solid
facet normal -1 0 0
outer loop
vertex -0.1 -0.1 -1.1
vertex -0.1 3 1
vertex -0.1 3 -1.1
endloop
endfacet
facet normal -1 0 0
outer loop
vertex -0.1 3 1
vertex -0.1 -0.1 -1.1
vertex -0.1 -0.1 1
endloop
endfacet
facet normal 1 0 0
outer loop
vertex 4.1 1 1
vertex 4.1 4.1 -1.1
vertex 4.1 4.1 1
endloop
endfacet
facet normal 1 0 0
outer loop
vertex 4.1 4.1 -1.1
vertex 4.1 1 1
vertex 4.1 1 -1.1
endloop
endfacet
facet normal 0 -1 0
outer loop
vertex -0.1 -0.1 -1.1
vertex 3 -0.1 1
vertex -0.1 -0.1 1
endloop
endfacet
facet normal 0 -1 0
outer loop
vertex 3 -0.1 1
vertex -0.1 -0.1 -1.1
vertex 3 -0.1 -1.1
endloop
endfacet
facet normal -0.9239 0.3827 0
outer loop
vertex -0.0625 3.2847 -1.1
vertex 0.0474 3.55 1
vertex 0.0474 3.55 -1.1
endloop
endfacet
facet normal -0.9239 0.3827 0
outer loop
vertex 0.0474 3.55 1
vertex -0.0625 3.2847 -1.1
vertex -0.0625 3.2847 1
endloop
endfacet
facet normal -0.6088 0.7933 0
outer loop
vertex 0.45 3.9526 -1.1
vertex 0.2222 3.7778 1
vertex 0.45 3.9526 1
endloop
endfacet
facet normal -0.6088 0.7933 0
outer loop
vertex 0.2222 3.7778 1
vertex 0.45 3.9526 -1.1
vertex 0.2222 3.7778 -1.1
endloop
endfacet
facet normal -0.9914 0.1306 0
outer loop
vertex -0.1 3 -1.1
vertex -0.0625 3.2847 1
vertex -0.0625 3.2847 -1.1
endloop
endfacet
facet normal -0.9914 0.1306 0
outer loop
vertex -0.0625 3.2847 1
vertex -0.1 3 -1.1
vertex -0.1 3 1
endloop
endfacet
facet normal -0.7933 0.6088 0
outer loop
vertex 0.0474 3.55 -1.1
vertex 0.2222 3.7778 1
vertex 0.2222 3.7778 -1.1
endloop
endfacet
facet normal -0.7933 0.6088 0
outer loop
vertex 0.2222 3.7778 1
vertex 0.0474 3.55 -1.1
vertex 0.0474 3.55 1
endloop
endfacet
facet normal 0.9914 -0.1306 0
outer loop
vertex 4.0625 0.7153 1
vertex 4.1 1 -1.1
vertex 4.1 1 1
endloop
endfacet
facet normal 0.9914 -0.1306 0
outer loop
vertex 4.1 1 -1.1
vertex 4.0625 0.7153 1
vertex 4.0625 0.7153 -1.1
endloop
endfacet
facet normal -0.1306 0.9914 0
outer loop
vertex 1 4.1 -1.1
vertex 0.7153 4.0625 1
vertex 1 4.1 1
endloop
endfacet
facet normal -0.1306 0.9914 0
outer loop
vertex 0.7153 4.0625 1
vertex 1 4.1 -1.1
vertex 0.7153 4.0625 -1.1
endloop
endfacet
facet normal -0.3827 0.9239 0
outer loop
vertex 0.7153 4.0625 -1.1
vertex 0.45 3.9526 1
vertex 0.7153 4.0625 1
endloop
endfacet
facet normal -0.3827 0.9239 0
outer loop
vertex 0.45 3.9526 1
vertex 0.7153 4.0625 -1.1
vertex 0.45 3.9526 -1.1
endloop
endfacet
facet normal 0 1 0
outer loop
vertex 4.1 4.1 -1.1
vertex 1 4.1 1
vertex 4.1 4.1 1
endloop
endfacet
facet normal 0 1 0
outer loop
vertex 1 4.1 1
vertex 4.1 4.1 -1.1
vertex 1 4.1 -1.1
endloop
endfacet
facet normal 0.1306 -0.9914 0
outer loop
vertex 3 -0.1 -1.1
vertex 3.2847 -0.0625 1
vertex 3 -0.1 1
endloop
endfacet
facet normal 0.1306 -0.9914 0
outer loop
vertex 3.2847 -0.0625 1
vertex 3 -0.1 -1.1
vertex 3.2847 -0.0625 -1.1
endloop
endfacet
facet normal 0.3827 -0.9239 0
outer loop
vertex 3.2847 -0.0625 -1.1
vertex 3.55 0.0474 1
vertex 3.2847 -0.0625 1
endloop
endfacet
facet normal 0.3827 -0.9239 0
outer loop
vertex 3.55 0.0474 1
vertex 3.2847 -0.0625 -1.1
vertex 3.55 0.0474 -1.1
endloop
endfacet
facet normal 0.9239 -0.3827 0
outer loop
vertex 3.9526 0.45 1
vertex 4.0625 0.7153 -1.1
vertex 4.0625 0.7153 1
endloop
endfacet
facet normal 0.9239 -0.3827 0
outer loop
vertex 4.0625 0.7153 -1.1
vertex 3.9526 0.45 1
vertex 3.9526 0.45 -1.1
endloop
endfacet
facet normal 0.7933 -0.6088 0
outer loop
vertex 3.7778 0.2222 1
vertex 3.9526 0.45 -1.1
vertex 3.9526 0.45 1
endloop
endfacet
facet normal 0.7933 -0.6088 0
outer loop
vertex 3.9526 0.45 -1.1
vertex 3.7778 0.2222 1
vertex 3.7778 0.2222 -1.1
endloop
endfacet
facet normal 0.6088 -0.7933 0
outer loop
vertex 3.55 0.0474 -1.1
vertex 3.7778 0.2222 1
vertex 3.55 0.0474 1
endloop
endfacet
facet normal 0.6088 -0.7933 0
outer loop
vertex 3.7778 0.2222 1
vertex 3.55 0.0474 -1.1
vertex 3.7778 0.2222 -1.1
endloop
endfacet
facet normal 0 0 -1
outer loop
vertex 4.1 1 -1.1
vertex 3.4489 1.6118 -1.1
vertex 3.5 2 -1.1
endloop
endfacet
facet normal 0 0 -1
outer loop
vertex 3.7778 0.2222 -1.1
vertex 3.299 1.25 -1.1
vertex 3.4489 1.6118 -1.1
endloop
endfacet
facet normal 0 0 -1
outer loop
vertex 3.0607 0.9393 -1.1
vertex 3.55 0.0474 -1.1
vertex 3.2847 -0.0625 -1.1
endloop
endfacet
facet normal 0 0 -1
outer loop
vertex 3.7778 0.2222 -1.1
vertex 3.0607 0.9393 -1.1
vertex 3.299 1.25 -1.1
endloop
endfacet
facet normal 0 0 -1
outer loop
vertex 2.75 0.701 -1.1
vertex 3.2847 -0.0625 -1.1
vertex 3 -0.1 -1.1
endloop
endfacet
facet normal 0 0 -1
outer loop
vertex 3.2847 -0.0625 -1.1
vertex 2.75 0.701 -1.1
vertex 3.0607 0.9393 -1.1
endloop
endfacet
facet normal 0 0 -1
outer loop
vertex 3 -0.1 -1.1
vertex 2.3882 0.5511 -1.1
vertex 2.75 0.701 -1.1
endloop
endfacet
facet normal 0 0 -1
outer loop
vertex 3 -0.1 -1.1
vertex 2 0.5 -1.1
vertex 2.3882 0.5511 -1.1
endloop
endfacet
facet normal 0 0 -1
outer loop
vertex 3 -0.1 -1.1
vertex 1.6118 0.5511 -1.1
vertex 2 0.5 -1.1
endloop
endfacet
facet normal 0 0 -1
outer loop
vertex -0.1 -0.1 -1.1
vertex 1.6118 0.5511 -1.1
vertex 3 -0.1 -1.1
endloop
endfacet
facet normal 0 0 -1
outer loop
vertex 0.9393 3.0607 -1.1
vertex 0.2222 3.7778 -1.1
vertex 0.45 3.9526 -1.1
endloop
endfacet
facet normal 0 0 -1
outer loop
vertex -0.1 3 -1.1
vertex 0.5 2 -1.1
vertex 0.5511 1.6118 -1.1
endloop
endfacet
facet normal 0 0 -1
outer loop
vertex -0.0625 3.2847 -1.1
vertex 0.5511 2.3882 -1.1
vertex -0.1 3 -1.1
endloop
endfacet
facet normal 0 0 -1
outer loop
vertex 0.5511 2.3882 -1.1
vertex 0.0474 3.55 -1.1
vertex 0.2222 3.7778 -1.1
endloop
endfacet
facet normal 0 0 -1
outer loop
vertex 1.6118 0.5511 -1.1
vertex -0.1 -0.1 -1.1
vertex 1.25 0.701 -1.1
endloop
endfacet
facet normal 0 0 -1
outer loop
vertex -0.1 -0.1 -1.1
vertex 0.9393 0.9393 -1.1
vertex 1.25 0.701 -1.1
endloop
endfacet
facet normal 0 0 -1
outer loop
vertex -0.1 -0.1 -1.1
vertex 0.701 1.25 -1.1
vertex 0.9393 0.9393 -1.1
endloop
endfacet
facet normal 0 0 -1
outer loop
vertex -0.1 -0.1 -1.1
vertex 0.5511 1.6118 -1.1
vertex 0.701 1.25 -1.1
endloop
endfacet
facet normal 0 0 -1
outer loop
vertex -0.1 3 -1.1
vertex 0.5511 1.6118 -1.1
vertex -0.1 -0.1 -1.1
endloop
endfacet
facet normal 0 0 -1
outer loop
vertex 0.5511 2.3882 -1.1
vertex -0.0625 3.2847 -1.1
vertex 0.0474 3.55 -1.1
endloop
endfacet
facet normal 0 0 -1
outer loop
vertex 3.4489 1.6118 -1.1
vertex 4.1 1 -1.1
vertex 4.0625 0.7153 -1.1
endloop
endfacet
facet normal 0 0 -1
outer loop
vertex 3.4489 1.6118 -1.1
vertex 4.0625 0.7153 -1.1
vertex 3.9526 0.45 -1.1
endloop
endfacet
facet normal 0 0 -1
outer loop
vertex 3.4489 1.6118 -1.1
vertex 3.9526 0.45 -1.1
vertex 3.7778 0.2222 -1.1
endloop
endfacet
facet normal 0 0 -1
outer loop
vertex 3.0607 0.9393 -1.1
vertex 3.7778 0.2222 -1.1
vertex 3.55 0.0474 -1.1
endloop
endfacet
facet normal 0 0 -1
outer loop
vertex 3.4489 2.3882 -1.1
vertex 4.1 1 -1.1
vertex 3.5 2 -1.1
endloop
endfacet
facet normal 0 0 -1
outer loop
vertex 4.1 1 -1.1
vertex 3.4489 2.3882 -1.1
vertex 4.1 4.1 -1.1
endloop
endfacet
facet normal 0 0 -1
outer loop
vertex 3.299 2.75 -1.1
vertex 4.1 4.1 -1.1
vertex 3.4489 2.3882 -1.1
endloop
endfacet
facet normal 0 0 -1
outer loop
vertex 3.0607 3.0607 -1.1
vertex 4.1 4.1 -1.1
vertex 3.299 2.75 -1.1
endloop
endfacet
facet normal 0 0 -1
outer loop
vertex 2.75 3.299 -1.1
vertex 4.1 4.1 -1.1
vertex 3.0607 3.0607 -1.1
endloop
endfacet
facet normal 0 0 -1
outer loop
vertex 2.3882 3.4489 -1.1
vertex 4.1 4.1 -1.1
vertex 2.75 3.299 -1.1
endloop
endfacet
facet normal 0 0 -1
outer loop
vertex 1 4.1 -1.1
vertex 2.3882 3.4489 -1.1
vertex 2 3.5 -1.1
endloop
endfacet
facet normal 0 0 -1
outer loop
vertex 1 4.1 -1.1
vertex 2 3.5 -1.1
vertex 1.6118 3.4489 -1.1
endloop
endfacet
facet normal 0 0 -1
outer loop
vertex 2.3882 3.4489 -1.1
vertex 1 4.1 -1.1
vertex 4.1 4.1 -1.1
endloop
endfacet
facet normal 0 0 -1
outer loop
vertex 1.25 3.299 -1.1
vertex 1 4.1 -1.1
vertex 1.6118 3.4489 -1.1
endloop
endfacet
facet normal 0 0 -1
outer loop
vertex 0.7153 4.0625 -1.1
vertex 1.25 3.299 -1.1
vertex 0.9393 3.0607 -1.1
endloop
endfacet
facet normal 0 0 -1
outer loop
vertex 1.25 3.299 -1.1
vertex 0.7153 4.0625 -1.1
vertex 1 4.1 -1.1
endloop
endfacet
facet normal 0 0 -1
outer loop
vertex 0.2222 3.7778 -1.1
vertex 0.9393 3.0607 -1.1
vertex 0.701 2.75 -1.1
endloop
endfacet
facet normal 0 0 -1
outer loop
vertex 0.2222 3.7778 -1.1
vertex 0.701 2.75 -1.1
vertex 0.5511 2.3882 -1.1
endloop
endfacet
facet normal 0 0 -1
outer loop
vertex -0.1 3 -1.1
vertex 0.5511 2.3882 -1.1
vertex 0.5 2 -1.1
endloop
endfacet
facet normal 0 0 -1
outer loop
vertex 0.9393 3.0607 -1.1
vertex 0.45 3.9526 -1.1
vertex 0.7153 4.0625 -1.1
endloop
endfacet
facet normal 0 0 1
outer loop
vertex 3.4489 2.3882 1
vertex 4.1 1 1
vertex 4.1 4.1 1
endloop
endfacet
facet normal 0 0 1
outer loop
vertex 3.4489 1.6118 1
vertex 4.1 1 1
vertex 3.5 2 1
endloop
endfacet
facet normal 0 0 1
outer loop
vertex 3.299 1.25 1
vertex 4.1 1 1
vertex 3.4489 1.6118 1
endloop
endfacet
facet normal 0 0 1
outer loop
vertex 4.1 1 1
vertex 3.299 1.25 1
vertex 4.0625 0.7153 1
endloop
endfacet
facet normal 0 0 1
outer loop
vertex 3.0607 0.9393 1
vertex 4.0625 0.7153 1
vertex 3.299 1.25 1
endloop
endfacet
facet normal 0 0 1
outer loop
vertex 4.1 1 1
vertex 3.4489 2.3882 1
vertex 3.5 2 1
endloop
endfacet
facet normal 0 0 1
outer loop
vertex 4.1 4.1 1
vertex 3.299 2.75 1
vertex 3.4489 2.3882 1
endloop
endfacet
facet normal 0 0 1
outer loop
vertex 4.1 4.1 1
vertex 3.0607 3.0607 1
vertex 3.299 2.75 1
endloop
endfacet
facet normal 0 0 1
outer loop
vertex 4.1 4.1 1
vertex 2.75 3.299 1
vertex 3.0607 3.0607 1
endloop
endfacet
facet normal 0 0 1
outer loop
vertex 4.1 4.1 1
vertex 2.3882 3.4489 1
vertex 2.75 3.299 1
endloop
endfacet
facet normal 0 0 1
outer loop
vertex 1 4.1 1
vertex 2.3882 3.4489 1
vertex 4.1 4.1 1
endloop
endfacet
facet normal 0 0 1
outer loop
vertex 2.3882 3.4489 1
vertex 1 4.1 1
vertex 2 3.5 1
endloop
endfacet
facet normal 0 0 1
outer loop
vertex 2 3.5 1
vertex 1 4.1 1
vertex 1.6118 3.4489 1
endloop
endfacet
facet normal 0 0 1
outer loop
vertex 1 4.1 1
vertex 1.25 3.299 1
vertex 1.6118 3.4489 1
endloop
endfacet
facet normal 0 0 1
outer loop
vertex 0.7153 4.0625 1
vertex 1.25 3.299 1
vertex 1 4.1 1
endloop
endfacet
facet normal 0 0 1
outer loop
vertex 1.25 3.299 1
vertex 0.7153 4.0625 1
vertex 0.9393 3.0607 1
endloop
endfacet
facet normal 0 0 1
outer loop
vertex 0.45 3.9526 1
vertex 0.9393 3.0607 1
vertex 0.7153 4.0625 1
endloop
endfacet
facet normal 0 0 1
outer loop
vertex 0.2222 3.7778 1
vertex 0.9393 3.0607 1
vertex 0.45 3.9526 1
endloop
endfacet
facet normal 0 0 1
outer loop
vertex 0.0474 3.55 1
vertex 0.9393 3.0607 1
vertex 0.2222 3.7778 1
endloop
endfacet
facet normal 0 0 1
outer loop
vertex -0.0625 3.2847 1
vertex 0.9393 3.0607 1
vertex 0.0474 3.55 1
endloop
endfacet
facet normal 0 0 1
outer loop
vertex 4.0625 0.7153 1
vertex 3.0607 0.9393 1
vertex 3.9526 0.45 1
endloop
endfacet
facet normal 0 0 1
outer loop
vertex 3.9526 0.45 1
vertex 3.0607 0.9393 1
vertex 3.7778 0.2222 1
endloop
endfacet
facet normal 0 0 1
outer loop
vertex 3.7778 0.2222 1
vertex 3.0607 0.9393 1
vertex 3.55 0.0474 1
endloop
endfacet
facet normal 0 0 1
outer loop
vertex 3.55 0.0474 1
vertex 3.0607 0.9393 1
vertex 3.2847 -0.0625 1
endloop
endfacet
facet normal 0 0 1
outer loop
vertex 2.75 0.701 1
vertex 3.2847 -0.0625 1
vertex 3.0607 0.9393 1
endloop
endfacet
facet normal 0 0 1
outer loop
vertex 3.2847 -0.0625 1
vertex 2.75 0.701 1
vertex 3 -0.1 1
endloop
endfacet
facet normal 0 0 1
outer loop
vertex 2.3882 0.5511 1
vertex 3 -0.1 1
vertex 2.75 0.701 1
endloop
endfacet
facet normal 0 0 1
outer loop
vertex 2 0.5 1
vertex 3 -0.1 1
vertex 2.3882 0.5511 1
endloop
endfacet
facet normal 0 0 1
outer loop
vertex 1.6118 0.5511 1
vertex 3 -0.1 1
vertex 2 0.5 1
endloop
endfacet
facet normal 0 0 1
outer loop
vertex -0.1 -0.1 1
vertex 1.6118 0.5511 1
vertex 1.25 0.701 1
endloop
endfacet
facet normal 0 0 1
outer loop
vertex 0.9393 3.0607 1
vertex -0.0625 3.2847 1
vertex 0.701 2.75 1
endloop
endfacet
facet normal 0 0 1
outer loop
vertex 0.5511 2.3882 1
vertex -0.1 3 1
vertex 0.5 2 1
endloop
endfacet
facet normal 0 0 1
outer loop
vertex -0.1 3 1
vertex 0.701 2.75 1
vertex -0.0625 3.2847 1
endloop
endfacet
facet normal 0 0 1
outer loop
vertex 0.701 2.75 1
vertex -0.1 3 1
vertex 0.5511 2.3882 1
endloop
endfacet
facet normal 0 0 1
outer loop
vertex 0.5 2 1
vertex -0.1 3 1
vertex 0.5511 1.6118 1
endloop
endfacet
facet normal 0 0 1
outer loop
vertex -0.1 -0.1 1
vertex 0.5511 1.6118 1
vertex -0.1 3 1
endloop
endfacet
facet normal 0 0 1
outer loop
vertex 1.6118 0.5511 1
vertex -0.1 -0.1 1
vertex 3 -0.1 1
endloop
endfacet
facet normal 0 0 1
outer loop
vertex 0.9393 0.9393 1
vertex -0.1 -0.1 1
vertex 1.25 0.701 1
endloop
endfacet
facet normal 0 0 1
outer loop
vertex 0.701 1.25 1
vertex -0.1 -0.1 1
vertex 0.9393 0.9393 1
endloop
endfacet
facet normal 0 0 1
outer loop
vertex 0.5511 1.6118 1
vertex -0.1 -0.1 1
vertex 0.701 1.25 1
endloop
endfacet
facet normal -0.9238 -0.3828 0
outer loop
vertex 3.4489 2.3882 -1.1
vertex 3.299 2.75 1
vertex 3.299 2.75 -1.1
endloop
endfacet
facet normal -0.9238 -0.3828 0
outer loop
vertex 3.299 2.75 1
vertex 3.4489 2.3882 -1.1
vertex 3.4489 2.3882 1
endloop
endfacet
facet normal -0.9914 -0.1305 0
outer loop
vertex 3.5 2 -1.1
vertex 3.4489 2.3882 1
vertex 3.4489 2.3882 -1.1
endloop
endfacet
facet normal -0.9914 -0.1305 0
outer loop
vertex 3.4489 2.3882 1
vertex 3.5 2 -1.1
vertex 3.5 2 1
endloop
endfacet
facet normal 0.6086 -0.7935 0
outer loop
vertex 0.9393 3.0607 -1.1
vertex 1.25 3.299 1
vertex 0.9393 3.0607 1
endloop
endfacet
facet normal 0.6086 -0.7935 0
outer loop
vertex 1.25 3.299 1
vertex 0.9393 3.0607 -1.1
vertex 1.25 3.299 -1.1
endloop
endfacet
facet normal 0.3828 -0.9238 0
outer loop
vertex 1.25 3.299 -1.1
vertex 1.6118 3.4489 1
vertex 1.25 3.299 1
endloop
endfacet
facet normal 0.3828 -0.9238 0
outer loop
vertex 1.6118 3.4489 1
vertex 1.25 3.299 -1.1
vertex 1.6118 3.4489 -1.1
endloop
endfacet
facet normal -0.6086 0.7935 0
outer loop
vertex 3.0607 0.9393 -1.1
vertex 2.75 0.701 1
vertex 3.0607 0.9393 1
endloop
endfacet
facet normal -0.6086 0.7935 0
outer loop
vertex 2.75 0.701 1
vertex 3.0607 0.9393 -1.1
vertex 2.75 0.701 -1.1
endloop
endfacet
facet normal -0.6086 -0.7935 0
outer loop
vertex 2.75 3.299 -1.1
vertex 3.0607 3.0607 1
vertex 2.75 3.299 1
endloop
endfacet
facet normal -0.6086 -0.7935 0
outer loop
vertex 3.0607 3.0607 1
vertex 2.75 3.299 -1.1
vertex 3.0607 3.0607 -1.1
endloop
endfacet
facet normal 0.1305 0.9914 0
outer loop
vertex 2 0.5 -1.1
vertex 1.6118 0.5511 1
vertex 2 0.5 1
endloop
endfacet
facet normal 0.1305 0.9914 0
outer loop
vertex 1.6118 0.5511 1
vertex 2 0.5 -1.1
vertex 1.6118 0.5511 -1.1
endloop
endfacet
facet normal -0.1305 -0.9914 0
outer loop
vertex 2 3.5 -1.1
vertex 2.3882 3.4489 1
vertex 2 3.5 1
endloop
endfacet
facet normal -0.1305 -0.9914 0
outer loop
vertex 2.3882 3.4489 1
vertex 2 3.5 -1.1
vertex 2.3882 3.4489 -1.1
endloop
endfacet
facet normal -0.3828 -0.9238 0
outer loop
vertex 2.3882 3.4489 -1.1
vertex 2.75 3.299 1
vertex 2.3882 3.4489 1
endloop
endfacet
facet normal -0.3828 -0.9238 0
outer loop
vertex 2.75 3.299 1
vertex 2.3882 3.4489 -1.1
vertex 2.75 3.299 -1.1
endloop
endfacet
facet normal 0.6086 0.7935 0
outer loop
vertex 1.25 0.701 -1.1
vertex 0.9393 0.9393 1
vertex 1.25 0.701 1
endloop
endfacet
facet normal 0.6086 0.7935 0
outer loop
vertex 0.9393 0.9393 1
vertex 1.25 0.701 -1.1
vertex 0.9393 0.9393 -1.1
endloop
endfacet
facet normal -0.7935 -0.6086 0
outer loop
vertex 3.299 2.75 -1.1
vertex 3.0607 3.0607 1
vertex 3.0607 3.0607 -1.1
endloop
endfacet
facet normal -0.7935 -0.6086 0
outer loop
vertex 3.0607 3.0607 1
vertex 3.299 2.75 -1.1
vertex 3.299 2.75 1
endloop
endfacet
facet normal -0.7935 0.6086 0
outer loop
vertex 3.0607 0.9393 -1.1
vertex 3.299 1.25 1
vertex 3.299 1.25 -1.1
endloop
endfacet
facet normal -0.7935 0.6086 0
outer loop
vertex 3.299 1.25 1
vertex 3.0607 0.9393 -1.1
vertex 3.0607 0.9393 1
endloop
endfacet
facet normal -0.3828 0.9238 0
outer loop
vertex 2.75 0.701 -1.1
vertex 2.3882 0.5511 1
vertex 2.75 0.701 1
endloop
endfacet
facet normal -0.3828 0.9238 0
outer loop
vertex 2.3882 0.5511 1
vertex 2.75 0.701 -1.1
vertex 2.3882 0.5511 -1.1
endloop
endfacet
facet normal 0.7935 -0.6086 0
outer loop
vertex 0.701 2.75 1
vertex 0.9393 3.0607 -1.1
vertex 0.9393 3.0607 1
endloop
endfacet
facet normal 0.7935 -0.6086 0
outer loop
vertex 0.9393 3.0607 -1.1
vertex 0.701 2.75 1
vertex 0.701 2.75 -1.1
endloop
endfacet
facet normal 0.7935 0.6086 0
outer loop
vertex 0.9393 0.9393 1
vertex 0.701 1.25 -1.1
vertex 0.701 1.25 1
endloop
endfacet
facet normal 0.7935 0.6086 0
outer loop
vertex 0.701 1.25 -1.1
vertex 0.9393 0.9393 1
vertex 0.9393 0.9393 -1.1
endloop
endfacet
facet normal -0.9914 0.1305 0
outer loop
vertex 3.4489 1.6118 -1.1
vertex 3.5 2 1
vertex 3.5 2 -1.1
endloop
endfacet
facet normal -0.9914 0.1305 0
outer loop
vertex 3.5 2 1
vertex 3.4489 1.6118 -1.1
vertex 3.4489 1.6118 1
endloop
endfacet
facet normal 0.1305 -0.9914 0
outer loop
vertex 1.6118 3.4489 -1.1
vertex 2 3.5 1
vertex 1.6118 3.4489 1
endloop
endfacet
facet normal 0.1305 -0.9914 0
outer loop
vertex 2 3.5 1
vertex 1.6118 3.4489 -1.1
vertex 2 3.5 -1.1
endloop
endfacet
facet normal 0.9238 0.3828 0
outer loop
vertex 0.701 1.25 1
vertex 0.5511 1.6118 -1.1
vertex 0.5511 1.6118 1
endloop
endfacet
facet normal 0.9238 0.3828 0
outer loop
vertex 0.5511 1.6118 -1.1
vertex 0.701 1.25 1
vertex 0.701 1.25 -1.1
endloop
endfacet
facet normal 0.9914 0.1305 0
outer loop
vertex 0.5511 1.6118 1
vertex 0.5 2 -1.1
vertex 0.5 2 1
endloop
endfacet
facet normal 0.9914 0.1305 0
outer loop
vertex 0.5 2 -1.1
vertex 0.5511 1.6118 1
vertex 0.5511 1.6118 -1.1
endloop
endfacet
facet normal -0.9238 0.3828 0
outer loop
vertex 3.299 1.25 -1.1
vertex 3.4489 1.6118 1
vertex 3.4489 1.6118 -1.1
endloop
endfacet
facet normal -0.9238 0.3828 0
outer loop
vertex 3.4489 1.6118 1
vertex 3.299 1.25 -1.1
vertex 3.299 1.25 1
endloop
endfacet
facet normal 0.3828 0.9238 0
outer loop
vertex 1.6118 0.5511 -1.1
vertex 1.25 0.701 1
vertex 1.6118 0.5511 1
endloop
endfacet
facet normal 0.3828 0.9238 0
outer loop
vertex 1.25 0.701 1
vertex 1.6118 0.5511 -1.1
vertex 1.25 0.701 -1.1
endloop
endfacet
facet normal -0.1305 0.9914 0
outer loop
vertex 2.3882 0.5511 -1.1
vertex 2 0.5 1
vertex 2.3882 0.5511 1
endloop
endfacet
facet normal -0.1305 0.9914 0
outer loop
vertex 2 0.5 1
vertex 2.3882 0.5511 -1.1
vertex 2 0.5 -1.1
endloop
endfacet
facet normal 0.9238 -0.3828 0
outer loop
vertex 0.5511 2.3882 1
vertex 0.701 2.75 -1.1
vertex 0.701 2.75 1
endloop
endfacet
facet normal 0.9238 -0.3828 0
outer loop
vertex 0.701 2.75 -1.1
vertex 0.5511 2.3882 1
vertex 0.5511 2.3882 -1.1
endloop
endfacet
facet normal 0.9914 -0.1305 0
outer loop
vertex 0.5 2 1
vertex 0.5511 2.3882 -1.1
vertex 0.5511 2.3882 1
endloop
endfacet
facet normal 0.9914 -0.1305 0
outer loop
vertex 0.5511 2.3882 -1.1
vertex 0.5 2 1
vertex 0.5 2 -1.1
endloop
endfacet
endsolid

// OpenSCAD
// file: cube_vround.scad
module cube_vround(
	size=[10,10,10],
	round_corners=[true,true,true,true],
	rounding=3,
	center_xy=false,
	center_z=false,
	attach=0,
	wall_attach=0,
	quality=2, //integer from 1 to infinity
)
{
	assert(len(size)==3);
	assert(len(round_corners)==4);
	assert(rounding>0);
	assert(rounding<=size[0]/2);
	assert(rounding<=size[1]/2);
	assert(quality>0);
	assert(attach>=0);
	assert(wall_attach>=0);
	height=size[2]+attach;
	cyl_r=rounding+wall_attach;
	cyl_mvx=size[0]/2-rounding;
	cyl_mvy=size[1]/2-rounding;
	cube_szx=size[0]/2;
	cube_szy=size[1]/2;
	cube_mvx=cube_szx/2+wall_attach;
	cube_mvy=cube_szy/2+wall_attach;
	translate([center_xy?0:cx,center_xy?0:cy,center_z?-attach/2:(size[2]-attach)/2])
		hull()
		{
			if(round_corners[0])
				translate([cyl_mvx,cyl_mvy])
					cylinder(r=cyl_r,h=height,$fn=12*quality,center=true);
			else
				translate([cube_mvx,cube_mvy])
					cube([cube_szx,cube_szy,height],center=true);
			if(round_corners[1])
				translate([cyl_mvx,-cyl_mvy])
					cylinder(r=cyl_r,h=height,$fn=12*quality,center=true);
			else
				translate([cube_mvx,-cube_mvy])
					cube([cube_szx,cube_szy,height],center=true);
			if(round_corners[2])
				translate([-cyl_mvx,-cyl_mvy])
					cylinder(r=cyl_r,h=height,$fn=12*quality,center=true);
			else
				translate([-cube_mvx,-cube_mvy])
					cube([cube_szx,cube_szy,height],center=true);
			if(round_corners[3])
				translate([-cyl_mvx,cyl_mvy])
					cylinder(r=cyl_r,h=height,$fn=12*quality,center=true);
			else
				translate([-cube_mvx,cube_mvy])
					cube([cube_szx,cube_szy,height],center=true);
		};
}

//example
cube_vround(round_corners=[true,false,true,false],
size=[10,20,6],
attach=0.1,
wall_attach=0.1,
rounding=3,
center_xy=true,center_z=false);
// main file
use <cube_vround.scad>

module stand_vround(
	width=6,
	height=4,
	inner_diam=3,
	round_corners=[true,true,true,true],
	rounding=1,
	center_xy=false,
	center_z=false,
	attach=0,
	wall_attach=0,
	quality=2, //integer from 1 to infinity
)
{
	assert(inner_diam<width);
	hole_height=height+attach+0.2;
	hole_mvz=-attach-0.1;
	translate([center_xy?0:width/2,center_xy?0:width/2,center_z?-height/2:0])
	difference()
	{
		//draw rounded cube
		cube_vround(size=[width,width,height],
								round_corners=round_corners,
								rounding=rounding,
								center_xy=true,
								center_z=false,
								attach=attach,
								wall_attach=wall_attach,
								quality=quality);
		//drill the hole
		translate([0,0,hole_mvz])
			cylinder(d=inner_diam,h=hole_height,$fn=12*quality);
	}
}

//example
stand_vround(round_corners=[false,true,false,true],
width=4,
height=2,
inner_diam=3,
rounding=1,
attach=0.1,
wall_attach=0.1,
center_xy=false,center_z=true);
